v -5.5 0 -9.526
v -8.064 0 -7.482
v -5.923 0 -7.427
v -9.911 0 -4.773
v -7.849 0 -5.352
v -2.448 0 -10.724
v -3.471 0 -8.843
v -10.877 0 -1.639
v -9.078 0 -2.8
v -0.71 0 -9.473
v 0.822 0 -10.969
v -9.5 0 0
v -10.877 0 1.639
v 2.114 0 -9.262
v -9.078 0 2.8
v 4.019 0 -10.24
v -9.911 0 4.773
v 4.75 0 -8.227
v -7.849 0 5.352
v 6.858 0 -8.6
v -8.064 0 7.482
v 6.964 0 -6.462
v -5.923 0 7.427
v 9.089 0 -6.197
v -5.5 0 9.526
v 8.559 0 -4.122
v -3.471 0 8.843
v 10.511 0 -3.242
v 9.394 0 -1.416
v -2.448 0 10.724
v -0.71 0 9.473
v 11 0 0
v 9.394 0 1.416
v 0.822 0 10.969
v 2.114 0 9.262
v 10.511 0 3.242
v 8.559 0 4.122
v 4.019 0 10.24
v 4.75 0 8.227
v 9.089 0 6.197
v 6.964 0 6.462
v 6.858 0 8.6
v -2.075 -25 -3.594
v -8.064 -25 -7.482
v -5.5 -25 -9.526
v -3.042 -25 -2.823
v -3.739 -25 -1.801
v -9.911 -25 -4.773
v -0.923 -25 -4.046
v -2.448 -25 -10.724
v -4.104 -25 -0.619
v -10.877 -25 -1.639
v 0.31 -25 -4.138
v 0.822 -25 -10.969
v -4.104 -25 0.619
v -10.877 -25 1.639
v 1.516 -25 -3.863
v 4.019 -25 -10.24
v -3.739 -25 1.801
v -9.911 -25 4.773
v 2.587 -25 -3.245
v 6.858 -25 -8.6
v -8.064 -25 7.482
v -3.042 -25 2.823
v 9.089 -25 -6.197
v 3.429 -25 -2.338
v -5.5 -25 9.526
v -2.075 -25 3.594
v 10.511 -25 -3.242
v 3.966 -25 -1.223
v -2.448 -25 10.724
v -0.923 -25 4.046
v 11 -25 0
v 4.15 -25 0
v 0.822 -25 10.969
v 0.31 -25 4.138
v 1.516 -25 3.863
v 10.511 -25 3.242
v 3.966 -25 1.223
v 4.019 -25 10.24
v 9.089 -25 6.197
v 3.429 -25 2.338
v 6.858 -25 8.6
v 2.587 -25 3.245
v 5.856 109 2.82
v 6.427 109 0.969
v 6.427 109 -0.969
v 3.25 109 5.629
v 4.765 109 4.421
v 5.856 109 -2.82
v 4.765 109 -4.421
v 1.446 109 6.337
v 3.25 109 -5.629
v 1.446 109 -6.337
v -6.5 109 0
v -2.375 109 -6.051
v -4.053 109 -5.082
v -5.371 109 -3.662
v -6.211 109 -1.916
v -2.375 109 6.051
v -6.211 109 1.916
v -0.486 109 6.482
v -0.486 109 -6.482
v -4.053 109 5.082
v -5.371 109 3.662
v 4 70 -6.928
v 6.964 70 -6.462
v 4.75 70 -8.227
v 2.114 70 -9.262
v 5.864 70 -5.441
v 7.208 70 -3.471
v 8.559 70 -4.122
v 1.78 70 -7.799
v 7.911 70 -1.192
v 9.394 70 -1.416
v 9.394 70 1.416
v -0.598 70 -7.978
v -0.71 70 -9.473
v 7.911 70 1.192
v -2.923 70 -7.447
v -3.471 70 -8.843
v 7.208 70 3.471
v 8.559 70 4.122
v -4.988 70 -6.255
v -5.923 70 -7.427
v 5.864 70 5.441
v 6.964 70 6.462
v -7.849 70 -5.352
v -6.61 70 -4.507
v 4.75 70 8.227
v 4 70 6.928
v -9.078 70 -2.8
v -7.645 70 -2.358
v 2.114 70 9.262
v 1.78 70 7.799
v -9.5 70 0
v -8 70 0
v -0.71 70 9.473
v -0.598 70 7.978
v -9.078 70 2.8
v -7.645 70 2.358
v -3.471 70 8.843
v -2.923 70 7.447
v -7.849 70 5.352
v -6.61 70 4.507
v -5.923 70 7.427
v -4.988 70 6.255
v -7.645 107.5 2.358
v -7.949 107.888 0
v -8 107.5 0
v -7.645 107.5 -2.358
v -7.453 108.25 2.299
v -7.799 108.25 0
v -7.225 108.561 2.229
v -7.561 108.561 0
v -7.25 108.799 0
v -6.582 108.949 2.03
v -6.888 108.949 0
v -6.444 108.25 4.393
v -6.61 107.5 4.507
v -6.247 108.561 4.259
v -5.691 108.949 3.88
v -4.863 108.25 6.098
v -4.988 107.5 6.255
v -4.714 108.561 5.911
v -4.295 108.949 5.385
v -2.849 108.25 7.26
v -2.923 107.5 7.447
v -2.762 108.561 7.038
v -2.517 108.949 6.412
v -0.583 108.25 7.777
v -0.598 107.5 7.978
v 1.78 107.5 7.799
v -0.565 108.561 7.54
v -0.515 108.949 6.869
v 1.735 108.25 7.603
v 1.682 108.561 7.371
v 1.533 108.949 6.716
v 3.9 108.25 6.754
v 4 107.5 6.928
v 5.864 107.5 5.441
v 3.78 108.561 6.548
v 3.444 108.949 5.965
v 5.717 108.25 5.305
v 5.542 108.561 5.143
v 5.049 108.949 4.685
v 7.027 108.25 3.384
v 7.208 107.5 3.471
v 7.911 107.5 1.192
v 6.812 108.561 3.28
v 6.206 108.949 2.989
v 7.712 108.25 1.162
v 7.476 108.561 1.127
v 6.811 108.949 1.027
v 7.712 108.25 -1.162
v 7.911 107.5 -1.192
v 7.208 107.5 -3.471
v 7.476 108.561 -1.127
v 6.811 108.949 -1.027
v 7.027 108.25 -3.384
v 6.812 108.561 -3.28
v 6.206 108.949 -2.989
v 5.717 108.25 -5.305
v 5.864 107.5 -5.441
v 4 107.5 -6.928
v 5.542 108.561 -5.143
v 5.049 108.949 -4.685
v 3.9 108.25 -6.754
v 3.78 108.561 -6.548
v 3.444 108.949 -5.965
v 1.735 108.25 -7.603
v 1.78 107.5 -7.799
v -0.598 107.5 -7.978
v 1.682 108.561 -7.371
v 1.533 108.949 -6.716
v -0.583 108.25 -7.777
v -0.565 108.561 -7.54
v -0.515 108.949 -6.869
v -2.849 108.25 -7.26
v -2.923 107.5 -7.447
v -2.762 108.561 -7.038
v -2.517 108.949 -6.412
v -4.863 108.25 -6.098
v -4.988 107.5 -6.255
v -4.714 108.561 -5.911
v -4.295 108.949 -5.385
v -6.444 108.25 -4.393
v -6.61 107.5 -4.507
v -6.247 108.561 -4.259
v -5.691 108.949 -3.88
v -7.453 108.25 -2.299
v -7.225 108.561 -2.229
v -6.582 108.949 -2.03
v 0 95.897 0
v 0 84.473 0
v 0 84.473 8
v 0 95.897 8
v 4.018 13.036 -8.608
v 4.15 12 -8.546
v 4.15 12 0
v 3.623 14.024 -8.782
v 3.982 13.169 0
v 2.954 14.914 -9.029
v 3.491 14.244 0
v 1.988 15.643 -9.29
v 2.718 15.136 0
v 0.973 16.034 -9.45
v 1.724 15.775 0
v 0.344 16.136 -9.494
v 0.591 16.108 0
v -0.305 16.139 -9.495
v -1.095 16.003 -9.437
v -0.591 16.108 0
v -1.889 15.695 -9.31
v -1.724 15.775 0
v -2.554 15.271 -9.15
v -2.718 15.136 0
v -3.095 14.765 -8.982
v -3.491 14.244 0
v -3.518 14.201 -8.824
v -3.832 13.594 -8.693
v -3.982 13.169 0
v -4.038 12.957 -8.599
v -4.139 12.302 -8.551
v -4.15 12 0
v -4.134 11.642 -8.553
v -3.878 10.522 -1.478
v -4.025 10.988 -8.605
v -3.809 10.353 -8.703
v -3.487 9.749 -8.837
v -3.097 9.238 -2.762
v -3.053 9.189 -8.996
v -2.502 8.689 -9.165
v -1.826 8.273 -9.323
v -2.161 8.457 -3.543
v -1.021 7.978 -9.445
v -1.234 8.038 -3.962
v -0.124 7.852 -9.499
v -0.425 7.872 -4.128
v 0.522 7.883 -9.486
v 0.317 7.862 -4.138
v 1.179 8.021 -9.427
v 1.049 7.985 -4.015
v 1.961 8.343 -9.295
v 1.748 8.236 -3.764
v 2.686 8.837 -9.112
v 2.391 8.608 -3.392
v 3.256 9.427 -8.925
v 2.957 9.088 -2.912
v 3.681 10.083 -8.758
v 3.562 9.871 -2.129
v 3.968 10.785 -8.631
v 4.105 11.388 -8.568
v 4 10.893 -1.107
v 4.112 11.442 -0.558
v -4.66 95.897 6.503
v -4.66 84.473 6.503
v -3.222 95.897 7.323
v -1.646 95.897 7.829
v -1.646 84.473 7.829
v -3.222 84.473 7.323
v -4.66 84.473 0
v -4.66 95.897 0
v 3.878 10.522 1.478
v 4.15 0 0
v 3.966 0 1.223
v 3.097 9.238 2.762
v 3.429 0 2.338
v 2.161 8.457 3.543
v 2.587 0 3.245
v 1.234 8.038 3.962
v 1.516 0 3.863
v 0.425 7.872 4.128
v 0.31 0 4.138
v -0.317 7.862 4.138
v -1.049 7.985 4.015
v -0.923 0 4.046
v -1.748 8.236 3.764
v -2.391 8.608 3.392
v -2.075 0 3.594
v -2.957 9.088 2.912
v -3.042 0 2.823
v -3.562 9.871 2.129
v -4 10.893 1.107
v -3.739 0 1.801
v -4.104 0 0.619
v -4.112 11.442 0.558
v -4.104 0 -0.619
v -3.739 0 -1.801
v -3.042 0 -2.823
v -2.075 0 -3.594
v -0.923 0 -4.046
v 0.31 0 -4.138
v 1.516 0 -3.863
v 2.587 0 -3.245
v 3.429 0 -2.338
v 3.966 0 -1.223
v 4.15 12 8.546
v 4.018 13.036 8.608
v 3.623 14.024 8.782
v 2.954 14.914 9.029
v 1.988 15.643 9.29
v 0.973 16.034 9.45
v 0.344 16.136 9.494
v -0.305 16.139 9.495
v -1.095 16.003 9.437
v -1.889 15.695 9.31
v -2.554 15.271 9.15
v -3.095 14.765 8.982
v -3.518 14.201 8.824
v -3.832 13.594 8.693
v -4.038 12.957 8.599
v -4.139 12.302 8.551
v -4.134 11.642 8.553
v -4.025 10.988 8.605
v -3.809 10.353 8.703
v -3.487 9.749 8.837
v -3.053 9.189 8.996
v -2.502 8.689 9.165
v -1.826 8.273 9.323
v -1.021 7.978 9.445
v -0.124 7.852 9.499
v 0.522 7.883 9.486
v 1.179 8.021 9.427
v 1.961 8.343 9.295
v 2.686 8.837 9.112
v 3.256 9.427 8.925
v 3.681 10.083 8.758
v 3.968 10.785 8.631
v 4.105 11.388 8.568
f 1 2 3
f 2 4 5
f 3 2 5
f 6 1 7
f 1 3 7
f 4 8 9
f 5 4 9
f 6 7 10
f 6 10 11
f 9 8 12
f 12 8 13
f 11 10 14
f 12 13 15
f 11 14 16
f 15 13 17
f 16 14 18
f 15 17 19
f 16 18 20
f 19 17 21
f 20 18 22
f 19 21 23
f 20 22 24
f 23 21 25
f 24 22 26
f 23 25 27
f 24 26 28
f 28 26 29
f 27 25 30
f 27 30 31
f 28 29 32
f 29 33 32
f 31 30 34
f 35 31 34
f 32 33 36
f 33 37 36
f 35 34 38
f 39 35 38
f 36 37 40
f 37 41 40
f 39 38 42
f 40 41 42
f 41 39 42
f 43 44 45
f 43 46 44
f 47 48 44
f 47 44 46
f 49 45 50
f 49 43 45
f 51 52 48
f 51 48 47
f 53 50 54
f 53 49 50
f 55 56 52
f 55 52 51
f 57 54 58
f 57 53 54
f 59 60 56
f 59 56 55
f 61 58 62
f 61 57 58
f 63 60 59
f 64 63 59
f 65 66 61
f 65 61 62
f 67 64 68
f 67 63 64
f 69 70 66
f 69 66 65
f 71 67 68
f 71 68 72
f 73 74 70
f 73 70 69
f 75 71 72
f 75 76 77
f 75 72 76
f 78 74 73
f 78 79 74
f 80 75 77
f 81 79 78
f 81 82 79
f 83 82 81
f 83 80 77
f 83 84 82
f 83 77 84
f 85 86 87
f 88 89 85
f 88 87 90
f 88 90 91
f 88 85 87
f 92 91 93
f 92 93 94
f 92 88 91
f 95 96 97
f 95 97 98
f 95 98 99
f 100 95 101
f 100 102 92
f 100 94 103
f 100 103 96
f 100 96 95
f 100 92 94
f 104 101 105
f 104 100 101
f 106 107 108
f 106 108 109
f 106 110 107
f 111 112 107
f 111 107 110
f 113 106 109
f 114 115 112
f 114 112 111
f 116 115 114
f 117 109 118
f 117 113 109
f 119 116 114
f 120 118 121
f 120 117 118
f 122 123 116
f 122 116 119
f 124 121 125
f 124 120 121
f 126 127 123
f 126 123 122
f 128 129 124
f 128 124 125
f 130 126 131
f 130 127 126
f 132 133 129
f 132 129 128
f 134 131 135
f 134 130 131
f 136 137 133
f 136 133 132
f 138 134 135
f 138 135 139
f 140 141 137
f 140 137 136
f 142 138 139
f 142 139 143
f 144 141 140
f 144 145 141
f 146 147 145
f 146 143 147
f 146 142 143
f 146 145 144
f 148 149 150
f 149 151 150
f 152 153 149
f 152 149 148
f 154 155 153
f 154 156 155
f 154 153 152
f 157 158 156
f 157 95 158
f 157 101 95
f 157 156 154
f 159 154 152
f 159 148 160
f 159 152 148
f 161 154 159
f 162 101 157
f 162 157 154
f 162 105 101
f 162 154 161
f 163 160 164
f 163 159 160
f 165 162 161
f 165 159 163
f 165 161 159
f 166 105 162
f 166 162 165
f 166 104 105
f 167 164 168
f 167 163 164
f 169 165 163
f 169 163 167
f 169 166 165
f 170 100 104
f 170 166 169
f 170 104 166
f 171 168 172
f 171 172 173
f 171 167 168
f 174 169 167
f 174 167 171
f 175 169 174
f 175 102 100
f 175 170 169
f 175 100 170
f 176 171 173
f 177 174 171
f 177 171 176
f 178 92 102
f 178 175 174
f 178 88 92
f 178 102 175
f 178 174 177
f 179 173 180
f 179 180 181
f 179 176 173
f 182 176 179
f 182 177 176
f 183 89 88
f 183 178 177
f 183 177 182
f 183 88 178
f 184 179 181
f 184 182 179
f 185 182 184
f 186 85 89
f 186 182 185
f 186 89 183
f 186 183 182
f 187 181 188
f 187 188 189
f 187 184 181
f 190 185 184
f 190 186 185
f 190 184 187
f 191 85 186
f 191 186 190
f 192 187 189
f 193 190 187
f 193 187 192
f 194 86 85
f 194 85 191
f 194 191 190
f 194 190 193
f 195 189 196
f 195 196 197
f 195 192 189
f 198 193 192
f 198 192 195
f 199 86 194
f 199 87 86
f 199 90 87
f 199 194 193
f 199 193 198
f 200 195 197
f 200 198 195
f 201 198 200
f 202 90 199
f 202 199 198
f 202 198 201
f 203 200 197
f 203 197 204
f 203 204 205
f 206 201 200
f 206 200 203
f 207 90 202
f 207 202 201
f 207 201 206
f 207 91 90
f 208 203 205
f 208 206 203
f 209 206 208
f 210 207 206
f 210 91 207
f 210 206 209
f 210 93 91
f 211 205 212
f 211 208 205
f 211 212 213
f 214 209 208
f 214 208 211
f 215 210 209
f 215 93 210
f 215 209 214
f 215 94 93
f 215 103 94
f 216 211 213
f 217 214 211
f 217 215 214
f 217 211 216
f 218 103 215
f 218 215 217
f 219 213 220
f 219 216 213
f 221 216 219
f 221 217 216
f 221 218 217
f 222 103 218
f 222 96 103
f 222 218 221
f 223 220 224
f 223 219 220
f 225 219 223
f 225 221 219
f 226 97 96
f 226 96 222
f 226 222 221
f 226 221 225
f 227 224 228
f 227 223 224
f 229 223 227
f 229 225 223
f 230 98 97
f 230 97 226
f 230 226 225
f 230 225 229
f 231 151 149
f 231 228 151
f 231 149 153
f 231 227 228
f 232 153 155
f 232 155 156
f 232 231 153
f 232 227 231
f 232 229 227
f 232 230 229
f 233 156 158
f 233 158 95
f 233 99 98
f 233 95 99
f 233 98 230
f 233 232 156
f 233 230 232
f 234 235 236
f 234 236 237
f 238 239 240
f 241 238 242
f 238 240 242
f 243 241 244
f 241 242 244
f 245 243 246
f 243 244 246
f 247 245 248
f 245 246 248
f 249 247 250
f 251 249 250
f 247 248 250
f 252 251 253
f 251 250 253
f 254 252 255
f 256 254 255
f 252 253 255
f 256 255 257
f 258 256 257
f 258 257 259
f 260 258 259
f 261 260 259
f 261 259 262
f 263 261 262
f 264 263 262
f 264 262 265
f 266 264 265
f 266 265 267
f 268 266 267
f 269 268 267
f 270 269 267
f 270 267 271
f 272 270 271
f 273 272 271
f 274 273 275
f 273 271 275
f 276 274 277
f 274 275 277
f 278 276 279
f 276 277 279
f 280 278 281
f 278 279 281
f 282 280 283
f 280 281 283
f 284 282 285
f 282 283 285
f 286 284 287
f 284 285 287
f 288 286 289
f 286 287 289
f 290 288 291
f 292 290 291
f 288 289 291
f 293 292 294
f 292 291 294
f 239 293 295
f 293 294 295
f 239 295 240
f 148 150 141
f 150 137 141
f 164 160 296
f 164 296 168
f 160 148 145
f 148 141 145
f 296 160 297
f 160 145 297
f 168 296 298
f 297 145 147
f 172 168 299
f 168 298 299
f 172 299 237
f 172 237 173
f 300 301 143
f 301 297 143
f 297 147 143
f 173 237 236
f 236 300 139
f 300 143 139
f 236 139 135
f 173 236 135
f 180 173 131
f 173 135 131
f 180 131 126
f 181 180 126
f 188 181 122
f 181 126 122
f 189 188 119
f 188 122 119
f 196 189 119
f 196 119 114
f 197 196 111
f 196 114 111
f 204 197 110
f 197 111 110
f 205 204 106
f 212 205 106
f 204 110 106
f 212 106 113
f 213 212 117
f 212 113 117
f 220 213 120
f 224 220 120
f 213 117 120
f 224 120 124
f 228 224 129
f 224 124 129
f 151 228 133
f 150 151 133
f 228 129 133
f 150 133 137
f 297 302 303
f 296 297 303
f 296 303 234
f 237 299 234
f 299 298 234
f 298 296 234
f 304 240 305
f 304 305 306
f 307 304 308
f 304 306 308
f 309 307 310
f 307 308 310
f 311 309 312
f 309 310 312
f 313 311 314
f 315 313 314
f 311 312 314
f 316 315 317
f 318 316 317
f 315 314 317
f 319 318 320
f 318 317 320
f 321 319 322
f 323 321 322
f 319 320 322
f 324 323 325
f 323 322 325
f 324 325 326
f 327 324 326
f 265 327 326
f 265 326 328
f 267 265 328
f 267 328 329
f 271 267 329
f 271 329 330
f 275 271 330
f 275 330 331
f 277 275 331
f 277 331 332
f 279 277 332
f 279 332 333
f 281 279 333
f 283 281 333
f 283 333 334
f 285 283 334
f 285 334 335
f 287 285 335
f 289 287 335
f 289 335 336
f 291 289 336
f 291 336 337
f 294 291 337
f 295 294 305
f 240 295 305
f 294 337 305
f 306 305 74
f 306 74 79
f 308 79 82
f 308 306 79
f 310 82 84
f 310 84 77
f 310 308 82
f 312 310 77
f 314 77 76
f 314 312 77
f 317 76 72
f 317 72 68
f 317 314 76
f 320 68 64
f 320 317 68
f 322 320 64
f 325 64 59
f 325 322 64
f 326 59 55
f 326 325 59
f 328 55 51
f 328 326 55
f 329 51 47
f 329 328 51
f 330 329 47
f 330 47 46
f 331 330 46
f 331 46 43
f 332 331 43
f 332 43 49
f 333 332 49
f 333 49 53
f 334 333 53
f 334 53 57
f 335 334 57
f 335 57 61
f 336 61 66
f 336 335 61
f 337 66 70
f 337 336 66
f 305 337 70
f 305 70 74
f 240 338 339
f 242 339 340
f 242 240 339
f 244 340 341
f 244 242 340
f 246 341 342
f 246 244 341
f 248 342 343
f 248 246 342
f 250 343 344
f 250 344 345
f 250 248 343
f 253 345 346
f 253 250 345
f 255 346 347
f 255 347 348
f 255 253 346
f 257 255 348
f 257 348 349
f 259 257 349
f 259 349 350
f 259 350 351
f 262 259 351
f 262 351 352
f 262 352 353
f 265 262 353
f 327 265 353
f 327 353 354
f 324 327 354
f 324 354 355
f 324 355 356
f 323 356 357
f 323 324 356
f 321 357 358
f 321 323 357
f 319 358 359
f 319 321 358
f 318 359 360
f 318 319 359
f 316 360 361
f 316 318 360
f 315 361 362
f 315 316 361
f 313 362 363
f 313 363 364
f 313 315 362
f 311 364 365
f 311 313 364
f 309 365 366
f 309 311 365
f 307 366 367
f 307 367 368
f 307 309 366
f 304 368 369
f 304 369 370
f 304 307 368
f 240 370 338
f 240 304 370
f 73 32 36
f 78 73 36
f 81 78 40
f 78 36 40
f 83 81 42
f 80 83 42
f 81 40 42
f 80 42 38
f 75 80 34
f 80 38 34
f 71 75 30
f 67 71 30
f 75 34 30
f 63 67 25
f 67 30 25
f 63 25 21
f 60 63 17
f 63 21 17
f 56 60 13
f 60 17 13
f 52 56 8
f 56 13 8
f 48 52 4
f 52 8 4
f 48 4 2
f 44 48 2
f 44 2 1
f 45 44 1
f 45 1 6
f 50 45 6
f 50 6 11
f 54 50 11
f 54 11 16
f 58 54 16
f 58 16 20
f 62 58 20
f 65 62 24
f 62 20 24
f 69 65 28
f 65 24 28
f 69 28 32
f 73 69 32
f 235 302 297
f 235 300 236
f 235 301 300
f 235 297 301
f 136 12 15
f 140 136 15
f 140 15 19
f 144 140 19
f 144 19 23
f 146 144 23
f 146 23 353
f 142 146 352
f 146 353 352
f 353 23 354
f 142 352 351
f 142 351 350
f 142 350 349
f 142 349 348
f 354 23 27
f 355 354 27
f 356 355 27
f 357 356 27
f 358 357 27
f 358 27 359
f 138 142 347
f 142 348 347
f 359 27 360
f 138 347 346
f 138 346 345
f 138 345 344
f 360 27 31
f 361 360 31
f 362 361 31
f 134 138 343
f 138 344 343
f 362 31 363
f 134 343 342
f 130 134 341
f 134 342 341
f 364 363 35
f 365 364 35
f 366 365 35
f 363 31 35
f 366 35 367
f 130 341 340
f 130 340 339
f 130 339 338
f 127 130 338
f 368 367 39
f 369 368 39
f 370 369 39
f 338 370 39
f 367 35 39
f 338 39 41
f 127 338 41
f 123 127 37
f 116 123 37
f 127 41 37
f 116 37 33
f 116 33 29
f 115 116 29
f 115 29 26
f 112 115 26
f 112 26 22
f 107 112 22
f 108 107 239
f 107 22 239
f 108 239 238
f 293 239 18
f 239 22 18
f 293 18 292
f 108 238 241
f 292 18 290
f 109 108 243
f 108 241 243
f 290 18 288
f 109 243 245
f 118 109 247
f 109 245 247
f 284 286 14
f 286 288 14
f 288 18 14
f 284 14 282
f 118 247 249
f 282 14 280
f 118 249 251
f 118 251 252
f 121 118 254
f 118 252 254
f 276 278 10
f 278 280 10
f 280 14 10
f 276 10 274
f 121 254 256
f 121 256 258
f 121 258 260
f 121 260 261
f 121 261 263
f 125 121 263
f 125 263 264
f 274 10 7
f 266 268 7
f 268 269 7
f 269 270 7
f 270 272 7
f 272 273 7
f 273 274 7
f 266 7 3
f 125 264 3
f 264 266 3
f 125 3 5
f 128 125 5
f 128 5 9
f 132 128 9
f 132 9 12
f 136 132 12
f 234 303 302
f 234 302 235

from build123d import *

# Parameters (mm, degrees)
F0_R          = 11
F0_R_2        = 4.15
F1_DEPTH      = 25
F2_R          = 9.5
F2_R_2        = 4.15
F3_DEPTH      = 70
F4_R          = 4.15
F5_DEPTH      = 11.001
F5_DEPTH_BACK = 25
F6_R          = 4.15
F7_DEPTH      = 37
F8_R          = 8
F9_DEPTH      = 39
F10_R         = 1.5
F11_W         = 4.6595567837
F11_H         = 11.4234238863
F12_DEPTH     = 25


with BuildPart() as f1:
    # F0 (on Front) → F1 (new body)
    with BuildSketch(Plane.XZ):
        Circle(F0_R)
        Circle(F0_R_2, mode=Mode.SUBTRACT)
    extrude(amount=F1_DEPTH)

    # F2 (on face) → F3 (join)
    with BuildSketch(Plane(origin=(0, 0, 0), x_dir=(-1, 0, 0), z_dir=(0, 1, 0))):
        Circle(F2_R)
        Circle(F2_R_2, mode=Mode.SUBTRACT)
        Circle(F2_R_2)
    extrude(amount=F3_DEPTH)

    # F4 (on Top) → F5 (cut, two sides)
    with BuildSketch(Plane.XY) as f5_sk:
        with Locations((0, 12)):
            Circle(F4_R)
    extrude(amount=F5_DEPTH, mode=Mode.SUBTRACT)
    extrude(f5_sk.sketch, amount=-F5_DEPTH_BACK, mode=Mode.SUBTRACT)

    # F6 (on face) → F7 (cut)
    with BuildSketch(Plane.XZ.offset(25)):
        Circle(F6_R)
    extrude(amount=-F7_DEPTH, mode=Mode.SUBTRACT)

    # F8 (on face) → F9 (join)
    with BuildSketch(Plane(origin=(0, 70, 0), x_dir=(-1, 0, 0), z_dir=(0, 1, 0))):
        Circle(F8_R)
    extrude(amount=F9_DEPTH)

    # F10
    f10_edges = [f1.edges().sort_by_distance(p)[0] for p in [
        (8, 109, 0),
    ]]
    fillet(f10_edges, radius=F10_R)

    # F11 (on Top) → F12 (cut)
    with BuildSketch(Plane.XY):
        with Locations((-2.3297783919, 90.184956789)):
            Rectangle(F11_W, F11_H)
    extrude(amount=F12_DEPTH, mode=Mode.SUBTRACT)


solid = f1.part
